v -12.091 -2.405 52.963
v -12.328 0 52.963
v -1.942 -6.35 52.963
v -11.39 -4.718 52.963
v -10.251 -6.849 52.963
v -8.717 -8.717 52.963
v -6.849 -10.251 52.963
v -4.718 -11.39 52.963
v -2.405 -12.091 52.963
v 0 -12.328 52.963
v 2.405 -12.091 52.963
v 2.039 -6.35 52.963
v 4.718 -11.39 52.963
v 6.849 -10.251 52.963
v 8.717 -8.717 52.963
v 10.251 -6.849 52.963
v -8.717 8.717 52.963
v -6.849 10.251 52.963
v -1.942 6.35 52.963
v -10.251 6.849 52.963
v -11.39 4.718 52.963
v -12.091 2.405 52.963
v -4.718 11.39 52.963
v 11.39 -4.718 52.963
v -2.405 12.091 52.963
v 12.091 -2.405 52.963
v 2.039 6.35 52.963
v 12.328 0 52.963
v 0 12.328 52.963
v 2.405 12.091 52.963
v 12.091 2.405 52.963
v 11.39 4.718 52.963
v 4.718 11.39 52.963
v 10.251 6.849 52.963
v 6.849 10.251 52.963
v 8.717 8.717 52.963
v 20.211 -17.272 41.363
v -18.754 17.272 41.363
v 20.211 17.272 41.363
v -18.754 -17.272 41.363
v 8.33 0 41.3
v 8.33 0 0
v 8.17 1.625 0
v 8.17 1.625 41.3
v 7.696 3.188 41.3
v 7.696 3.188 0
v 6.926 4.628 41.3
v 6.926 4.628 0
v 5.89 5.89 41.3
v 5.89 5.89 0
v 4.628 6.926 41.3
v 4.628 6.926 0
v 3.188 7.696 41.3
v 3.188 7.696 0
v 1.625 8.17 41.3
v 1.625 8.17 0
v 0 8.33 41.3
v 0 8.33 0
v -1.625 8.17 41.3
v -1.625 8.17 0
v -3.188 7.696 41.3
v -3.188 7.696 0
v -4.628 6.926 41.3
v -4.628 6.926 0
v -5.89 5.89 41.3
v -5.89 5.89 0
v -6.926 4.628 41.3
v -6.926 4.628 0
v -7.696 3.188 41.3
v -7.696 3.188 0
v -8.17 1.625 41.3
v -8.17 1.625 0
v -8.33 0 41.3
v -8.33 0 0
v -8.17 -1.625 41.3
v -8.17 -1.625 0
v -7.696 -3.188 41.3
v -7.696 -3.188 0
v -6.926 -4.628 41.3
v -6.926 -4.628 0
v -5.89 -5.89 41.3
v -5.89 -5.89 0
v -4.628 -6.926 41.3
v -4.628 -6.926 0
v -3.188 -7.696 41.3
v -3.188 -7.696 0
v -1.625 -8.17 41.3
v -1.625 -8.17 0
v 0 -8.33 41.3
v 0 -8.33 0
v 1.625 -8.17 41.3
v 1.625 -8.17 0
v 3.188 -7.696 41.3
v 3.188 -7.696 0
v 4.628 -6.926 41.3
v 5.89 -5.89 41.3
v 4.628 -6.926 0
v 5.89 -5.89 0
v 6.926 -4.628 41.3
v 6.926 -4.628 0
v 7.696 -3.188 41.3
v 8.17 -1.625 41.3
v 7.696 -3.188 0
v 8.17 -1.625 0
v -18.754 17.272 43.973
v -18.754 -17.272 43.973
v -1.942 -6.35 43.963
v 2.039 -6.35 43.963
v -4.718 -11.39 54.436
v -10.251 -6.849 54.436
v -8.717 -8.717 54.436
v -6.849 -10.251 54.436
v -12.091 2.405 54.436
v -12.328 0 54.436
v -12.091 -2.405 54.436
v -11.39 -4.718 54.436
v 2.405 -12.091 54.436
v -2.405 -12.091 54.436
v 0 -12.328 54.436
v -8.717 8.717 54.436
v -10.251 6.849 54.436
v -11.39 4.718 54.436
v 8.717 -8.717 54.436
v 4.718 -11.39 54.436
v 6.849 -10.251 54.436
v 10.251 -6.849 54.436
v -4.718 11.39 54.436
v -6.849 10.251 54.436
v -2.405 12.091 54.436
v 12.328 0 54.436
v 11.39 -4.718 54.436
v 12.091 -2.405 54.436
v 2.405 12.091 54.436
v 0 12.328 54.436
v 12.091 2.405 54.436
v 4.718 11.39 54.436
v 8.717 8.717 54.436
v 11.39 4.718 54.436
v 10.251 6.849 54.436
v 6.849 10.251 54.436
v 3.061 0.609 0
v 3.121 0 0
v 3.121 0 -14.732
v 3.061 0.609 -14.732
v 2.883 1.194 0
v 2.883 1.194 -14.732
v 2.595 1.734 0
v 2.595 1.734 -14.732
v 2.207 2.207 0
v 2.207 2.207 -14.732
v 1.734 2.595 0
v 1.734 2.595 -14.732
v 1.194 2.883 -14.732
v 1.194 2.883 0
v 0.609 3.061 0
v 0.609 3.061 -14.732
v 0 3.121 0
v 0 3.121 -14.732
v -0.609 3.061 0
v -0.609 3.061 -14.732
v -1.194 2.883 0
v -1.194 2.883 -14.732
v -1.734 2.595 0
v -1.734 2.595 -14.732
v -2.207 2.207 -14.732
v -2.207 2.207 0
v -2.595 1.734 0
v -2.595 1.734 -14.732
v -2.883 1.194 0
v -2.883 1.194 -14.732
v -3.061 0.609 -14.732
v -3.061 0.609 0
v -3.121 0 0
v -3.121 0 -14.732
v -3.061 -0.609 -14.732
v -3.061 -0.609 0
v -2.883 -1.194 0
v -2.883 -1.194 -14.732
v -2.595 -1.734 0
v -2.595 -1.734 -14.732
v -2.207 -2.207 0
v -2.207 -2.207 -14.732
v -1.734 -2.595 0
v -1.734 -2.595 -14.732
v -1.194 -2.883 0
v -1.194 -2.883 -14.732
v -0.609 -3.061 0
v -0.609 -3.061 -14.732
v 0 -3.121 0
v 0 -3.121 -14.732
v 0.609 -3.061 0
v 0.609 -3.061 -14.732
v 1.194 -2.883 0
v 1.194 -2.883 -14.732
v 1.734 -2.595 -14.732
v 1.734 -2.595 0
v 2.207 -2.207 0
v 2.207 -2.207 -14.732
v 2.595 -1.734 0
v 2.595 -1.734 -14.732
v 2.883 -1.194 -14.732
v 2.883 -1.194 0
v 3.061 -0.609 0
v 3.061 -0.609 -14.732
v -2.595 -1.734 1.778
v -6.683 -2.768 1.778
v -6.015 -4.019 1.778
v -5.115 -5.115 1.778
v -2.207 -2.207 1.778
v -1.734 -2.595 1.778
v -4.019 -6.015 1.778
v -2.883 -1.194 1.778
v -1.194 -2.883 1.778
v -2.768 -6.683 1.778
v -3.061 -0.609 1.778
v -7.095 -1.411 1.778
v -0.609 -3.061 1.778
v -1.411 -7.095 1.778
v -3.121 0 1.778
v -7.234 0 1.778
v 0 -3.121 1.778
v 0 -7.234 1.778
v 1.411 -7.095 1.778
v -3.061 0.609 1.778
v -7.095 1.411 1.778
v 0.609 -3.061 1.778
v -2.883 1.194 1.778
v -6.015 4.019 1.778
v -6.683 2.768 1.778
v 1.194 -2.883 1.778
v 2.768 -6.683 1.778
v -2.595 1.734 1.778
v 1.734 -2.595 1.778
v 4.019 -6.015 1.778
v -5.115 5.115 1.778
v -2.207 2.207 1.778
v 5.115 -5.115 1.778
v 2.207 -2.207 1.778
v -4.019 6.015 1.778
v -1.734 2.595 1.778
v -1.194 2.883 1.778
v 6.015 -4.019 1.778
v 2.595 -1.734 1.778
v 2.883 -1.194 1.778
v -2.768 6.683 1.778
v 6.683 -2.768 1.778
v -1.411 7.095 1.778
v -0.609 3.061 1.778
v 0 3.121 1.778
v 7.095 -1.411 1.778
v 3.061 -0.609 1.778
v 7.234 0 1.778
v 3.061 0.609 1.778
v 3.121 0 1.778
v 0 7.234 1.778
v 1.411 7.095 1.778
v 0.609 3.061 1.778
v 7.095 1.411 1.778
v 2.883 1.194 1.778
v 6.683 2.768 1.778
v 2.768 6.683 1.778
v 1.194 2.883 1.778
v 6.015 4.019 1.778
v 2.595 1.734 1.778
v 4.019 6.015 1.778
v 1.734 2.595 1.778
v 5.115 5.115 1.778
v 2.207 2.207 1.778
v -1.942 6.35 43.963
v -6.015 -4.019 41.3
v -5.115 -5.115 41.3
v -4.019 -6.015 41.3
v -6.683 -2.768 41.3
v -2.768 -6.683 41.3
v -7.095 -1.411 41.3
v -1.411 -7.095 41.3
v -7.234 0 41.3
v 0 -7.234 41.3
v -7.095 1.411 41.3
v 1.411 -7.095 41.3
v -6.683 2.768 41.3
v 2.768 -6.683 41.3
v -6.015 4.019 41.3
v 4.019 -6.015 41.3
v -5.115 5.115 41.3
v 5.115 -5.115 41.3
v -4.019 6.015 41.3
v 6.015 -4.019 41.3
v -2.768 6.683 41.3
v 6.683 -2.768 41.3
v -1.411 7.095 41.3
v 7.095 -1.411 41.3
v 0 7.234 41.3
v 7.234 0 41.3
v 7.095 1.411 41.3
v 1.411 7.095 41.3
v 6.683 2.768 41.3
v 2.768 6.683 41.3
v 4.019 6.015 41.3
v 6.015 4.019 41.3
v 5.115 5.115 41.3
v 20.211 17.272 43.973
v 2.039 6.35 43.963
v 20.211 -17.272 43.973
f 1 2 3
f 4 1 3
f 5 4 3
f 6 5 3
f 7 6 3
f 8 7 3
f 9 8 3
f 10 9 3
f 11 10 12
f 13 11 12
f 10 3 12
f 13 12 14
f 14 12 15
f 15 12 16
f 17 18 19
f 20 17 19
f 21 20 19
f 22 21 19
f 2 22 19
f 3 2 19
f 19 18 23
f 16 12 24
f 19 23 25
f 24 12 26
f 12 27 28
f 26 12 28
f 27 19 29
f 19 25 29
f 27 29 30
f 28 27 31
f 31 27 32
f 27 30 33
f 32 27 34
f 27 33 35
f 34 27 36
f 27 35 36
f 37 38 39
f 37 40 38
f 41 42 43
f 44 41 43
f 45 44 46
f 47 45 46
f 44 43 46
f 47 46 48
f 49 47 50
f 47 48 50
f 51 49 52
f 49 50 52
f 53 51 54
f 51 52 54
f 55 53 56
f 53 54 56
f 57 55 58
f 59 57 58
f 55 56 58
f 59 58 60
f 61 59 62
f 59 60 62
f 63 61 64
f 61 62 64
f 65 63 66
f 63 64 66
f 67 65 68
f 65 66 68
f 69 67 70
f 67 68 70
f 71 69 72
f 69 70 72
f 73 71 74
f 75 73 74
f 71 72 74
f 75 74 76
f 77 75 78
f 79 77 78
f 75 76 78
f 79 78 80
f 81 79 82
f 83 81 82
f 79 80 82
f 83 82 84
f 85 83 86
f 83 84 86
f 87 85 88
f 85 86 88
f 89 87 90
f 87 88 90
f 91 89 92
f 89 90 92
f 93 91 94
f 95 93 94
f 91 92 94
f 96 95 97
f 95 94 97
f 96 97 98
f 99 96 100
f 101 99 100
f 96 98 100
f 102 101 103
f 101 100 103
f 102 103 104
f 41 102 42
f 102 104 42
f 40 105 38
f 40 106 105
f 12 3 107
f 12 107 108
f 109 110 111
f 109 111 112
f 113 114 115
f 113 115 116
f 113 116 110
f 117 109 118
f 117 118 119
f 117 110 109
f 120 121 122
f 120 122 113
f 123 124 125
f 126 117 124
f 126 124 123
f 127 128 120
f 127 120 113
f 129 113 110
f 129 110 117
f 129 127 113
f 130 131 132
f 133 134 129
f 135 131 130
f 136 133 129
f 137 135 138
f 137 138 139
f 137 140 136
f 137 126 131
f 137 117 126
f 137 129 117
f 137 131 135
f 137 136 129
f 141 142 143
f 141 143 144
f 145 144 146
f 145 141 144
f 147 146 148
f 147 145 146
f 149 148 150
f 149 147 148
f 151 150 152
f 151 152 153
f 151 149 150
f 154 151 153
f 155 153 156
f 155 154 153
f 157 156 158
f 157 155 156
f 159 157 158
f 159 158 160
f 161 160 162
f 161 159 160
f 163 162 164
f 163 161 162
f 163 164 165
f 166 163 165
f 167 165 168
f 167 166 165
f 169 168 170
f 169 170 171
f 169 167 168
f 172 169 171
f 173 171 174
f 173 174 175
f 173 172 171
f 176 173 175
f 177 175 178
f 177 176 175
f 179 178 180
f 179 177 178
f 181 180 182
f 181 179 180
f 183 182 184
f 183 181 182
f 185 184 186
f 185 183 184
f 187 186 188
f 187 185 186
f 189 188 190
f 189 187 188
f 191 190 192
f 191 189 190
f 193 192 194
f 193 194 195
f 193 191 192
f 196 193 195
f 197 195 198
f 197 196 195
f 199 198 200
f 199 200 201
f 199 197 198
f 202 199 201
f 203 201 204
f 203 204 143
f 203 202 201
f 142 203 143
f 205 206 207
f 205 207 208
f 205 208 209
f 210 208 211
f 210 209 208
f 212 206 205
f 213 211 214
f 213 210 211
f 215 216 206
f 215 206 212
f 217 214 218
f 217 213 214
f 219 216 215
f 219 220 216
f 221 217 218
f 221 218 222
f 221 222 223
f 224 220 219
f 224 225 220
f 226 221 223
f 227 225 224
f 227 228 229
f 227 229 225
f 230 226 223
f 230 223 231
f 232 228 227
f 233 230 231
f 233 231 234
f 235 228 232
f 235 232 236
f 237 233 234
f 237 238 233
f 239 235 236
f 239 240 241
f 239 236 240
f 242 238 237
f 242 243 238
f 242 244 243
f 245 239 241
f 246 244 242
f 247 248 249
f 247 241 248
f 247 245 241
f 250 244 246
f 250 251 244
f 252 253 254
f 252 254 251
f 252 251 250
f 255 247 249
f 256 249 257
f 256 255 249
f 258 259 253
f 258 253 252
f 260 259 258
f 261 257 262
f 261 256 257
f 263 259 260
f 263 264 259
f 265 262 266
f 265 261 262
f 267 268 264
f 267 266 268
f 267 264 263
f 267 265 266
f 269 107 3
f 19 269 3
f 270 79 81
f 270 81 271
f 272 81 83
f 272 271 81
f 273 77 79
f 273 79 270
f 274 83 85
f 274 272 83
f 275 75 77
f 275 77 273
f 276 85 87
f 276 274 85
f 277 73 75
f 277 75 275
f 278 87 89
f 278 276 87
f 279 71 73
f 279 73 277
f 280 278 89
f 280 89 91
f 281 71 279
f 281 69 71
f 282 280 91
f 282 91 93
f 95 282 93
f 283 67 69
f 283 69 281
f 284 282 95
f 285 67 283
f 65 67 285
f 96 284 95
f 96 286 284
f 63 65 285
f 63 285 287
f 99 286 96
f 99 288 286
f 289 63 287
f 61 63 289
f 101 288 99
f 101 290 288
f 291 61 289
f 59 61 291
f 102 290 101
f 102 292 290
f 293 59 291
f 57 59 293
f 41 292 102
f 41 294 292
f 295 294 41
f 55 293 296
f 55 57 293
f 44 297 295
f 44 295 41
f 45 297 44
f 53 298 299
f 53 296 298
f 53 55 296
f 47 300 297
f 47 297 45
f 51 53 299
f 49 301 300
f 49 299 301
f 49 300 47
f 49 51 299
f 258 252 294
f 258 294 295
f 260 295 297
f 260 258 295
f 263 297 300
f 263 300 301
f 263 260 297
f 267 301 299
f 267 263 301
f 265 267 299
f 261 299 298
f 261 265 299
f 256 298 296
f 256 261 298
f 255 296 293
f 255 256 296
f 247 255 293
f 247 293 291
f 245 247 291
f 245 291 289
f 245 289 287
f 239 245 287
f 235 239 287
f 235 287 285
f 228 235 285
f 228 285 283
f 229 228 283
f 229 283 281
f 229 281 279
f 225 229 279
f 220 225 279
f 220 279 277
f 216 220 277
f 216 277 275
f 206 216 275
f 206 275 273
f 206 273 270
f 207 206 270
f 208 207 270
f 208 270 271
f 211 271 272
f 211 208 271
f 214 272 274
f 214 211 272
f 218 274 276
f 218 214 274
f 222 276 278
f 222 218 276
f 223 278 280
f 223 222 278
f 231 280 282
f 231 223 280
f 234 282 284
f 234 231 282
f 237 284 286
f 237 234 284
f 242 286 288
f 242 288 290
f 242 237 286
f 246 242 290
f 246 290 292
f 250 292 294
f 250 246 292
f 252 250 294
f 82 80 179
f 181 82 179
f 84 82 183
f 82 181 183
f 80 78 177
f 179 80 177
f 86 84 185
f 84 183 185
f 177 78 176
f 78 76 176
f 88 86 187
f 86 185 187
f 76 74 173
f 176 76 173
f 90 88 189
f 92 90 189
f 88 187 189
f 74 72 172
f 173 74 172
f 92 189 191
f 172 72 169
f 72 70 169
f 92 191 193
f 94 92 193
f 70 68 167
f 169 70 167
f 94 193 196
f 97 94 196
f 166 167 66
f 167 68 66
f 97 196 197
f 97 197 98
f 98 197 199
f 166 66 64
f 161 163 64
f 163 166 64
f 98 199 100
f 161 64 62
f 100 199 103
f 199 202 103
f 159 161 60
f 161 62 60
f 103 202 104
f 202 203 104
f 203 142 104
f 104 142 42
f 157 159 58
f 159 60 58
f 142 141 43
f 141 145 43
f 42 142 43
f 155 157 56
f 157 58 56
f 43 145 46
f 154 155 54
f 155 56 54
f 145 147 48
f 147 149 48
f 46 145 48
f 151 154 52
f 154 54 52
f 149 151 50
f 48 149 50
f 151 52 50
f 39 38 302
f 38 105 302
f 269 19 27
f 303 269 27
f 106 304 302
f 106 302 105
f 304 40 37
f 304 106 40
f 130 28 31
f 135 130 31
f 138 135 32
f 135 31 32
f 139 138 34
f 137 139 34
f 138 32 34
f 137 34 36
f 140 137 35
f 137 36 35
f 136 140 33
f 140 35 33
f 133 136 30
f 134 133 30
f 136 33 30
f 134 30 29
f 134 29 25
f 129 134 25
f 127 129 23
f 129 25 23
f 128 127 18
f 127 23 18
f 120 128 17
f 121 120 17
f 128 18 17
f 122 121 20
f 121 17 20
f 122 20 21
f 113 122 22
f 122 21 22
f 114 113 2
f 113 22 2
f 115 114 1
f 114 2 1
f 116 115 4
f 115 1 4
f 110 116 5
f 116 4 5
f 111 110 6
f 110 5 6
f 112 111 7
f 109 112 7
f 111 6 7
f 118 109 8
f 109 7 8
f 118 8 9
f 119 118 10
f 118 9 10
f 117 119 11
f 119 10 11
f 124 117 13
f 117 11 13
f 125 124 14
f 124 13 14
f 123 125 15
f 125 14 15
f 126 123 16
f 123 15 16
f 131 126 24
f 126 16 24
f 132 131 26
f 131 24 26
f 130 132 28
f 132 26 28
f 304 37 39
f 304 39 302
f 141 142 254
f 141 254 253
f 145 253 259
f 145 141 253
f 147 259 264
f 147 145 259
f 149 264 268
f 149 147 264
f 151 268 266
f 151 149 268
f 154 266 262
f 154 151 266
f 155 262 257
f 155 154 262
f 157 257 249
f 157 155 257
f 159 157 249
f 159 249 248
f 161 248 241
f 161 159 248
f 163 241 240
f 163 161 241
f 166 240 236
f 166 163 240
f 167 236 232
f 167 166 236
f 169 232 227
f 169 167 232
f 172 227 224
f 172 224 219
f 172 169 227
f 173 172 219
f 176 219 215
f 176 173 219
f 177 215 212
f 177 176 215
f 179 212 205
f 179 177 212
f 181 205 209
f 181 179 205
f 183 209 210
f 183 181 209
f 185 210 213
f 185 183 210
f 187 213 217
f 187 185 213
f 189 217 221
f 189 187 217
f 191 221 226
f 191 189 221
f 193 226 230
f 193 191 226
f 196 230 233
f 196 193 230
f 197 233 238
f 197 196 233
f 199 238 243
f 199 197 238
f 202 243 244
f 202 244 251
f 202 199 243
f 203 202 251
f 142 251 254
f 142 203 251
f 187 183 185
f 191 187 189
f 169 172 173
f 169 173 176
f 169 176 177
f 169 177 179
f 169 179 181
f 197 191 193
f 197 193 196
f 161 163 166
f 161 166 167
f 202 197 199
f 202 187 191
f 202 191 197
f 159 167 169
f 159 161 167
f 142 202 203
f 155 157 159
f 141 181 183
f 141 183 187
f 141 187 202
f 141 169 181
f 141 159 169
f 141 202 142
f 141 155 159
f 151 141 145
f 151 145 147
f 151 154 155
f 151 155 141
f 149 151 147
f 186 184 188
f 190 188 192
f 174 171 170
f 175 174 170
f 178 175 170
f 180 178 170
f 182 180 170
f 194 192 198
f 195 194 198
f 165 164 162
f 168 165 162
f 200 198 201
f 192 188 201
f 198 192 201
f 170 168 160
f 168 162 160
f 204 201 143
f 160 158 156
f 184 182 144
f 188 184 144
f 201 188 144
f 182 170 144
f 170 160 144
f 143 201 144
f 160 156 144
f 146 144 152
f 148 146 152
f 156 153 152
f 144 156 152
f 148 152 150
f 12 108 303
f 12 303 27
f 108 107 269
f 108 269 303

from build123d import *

# Parameters (mm, degrees)
F0_R      = 8.33
F0_R_2    = 7.2338998847
F1_DEPTH  = 41.3
F0_R_3    = 3.120788822
F3_DEPTH  = 1.778
F4_DEPTH  = 14.732
F6_DEPTH  = 17.272
F7_W      = 3.9808914298
F7_H      = 9.0002007782
F8_DEPTH  = 6.35
F11_R     = 12.3283850527
F11_W     = 3.9808914298
F11_H     = 12.7
F12_DEPTH = 1.4732


# Not quite as in the source:
# - the program builds the solid bodies; features that only make, move or delete a surface that nothing else refers to are left out


with BuildPart() as f1:
    # F0 (on Top) → F1 (new body)
    with BuildSketch(Plane.XY):
        Circle(F0_R)
        Circle(F0_R_2, mode=Mode.SUBTRACT)
    extrude(amount=F1_DEPTH)

    # F0 (on Top) → F3 (join)
    with BuildSketch(Plane.XY):
        Circle(F0_R_2)
        Circle(F0_R_3, mode=Mode.SUBTRACT)
    extrude(amount=F3_DEPTH)


with BuildPart() as f4:
    # F0 (on Top) → F4 (new body)
    with BuildSketch(Plane.XY):
        Circle(F0_R_3)
    extrude(amount=-F4_DEPTH)


with BuildPart() as f6:
    # F5 (on Front) → F6 (new body, symmetric)
    with BuildSketch(Plane.XZ):
        Polygon((-18.754336983, 41.362978518), (0, 41.362978518), (20.2109832317, 41.362978518), (20.2109832317, 43.9725443721), (-18.754336983, 43.9725443721), align=None)
    extrude(amount=F6_DEPTH, both=True)


with BuildPart() as f8:
    # F7 (on Front) → F8 (new body, symmetric)
    with BuildSketch(Plane.XZ):
        with Locations((0.0484315096, 48.4631862491)):
            Rectangle(F7_W, F7_H)
    extrude(amount=F8_DEPTH, both=True)

    # F11 (on face) → F12 (join)
    with BuildSketch(Plane.XY.offset(52.9632866383)):
        Circle(F11_R)
        with Locations((0.0484315096, 0)):
            Rectangle(F11_W, F11_H, mode=Mode.SUBTRACT)
        Circle(F11_R)
    extrude(amount=F12_DEPTH)


solid = Compound([f1.part, f4.part, f6.part, f8.part])
